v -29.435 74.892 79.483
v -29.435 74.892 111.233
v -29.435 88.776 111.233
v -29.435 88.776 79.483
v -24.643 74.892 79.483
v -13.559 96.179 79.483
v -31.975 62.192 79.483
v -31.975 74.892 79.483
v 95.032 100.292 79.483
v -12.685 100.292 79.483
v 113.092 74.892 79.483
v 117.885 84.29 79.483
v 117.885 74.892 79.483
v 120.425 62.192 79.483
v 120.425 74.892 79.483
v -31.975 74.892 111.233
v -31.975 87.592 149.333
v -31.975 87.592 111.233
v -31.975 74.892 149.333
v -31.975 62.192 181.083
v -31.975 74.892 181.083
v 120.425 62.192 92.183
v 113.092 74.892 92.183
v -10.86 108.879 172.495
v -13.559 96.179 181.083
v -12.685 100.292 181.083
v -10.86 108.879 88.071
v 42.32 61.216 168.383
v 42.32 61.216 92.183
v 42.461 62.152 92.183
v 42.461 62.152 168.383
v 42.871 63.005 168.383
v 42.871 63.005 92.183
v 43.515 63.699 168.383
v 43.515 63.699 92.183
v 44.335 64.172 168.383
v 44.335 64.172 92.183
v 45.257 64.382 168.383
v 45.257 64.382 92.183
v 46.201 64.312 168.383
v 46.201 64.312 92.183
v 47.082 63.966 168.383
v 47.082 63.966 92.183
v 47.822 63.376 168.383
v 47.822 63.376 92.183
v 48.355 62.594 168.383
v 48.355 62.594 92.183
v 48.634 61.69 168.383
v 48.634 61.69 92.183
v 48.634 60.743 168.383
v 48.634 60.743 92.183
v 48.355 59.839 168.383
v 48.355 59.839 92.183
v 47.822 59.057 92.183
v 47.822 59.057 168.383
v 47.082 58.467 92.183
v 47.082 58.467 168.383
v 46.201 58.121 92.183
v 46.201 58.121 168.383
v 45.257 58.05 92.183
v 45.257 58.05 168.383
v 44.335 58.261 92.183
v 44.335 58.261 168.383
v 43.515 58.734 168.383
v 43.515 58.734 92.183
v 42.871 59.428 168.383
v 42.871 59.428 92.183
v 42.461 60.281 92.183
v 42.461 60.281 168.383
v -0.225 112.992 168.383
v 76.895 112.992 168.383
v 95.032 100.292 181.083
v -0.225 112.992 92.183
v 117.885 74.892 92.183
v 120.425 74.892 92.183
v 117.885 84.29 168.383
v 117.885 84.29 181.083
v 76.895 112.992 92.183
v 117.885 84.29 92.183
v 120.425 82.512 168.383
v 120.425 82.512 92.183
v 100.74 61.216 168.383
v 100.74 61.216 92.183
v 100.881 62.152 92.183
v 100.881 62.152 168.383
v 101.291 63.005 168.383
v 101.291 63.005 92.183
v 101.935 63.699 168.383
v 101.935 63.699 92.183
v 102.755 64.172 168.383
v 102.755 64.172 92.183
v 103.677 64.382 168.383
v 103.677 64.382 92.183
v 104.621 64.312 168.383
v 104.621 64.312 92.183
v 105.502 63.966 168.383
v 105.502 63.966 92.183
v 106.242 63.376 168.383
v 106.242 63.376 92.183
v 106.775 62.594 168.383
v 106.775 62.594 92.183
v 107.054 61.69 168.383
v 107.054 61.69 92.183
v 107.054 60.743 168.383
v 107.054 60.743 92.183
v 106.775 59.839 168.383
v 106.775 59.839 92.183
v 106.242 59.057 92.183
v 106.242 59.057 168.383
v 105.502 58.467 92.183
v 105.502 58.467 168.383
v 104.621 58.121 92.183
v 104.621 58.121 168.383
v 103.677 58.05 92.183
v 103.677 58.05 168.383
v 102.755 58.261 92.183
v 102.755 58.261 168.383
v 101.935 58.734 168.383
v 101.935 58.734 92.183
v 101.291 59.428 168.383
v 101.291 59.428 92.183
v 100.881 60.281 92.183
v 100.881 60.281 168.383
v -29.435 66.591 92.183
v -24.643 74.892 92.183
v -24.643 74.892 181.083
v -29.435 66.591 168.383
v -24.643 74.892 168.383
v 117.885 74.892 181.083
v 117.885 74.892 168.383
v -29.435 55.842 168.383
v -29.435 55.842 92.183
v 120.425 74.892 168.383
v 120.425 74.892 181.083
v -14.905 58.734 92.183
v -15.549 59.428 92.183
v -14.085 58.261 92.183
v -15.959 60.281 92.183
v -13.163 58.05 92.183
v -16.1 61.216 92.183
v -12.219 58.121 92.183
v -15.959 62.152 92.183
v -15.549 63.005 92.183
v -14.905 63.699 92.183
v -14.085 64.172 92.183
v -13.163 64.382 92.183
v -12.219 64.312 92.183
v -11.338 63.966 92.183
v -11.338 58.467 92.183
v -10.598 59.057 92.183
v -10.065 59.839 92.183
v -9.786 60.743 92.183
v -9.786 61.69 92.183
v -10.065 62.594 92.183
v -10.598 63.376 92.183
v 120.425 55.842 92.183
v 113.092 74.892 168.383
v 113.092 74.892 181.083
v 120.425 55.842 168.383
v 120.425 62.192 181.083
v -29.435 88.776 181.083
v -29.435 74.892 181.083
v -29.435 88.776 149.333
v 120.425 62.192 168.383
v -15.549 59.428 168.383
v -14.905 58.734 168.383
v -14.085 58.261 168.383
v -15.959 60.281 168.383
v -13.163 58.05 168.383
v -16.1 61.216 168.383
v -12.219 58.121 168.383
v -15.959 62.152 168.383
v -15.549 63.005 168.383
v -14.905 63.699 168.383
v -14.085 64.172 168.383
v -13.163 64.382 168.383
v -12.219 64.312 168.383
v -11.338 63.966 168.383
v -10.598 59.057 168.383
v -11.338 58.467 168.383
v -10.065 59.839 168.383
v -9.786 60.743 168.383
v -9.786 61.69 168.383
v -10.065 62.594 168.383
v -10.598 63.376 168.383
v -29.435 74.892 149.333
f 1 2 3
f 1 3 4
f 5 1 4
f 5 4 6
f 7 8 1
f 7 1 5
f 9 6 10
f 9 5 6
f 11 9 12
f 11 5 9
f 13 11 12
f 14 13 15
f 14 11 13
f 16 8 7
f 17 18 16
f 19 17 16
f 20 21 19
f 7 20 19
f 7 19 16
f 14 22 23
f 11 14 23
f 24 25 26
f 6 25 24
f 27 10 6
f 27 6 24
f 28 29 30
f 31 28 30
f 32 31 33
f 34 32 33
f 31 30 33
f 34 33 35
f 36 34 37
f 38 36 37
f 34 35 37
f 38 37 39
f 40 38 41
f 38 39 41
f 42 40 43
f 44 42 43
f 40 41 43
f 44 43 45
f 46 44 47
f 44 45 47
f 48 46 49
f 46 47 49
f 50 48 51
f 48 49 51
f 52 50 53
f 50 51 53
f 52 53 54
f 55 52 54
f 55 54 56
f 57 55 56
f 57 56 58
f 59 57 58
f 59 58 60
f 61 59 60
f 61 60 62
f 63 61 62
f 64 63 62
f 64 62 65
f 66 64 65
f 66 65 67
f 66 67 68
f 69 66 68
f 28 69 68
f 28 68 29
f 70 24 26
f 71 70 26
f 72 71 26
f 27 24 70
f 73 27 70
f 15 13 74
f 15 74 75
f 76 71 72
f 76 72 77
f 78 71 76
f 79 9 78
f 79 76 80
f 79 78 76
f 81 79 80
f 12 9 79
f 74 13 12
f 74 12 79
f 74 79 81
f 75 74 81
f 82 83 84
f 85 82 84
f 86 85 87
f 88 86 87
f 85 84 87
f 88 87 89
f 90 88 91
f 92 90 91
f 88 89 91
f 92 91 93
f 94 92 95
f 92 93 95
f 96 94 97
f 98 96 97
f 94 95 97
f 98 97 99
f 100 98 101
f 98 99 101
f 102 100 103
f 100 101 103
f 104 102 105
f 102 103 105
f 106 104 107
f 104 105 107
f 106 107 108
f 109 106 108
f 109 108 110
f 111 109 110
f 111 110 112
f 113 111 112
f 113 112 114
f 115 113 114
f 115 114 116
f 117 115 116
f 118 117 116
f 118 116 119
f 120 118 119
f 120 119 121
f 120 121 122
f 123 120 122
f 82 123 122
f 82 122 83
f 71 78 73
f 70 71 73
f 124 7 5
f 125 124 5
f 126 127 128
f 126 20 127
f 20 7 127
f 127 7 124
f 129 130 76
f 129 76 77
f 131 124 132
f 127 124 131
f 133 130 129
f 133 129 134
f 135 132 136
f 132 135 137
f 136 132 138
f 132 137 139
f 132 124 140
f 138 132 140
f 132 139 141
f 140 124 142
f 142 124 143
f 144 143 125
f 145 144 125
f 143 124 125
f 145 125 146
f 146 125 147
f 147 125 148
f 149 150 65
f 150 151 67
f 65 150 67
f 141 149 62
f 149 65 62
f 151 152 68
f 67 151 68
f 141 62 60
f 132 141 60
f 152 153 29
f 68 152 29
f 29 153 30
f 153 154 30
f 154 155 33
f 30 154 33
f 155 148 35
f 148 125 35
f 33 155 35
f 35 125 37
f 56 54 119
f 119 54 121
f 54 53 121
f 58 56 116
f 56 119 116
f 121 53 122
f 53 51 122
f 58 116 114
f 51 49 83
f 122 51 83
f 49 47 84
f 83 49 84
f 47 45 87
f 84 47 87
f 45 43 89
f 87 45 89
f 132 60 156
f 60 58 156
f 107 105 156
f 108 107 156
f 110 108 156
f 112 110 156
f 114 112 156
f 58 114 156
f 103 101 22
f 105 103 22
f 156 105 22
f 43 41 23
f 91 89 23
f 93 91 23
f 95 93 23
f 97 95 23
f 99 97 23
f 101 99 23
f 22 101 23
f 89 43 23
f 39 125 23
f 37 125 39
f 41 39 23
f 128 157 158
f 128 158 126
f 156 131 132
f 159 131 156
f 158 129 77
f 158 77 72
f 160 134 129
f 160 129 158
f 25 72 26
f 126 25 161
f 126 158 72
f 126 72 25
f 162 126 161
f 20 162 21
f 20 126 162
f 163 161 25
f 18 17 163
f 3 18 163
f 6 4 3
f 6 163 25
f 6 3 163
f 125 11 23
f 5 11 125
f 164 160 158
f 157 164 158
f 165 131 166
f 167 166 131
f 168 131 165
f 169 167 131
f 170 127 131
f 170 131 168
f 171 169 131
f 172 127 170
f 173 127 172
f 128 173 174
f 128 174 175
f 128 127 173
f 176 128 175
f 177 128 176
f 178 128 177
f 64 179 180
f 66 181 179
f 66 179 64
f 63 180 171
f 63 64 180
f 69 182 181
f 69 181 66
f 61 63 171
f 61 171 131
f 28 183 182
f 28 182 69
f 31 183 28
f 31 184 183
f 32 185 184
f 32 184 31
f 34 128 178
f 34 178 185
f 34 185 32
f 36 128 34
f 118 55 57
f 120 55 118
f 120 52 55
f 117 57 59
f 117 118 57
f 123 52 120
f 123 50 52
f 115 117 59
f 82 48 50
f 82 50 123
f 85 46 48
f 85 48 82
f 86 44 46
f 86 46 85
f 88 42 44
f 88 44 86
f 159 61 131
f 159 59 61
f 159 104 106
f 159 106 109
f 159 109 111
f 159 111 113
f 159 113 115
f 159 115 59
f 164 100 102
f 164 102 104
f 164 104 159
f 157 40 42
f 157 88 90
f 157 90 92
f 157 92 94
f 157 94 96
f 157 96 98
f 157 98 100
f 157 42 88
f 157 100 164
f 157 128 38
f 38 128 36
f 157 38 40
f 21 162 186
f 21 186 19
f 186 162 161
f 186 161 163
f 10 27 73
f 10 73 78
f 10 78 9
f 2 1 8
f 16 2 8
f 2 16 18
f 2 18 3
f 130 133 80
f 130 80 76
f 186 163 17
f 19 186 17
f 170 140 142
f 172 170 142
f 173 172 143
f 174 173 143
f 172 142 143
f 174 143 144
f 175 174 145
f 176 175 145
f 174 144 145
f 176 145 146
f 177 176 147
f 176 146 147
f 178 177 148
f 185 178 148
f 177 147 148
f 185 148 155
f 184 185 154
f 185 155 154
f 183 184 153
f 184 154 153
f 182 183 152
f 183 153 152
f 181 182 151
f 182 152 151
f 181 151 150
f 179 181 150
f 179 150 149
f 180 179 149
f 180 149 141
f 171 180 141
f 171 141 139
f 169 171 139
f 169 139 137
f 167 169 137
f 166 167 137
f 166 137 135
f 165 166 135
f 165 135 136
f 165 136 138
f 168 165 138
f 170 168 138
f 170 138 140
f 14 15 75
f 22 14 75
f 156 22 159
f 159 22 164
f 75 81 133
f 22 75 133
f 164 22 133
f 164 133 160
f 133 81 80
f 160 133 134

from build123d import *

# Parameters (mm, degrees)
BOSS_EXTRUDE1_DEPTH             = 38.1
CUT_EXTRUDE1_DEPTH              = 100.190170884
CUT_EXTRUDE1_DEPTH_BACK         = 100.190170884
BOSS_EXTRUDE2_REACH             = 101.19
BOSS_EXTRUDE2_DIRECTION_2_REACH = 101.19
CUT_EXTRUDE2_DEPTH              = 100.190170884
CUT_EXTRUDE2_DEPTH_BACK         = 100.190170884
SKETCH5_W                       = 149.86
SKETCH5_H                       = 76.2
BOSS_EXTRUDE4_DEPTH             = 19.05
SKETCH6_R                       = 3.175
CUT_EXTRUDE3_DEPTH              = 188.543158451


with BuildPart() as part:
    # Sketch1 → Boss-Extrude1 (new body)
    with BuildSketch(Plane(origin=(44.224720049, 74.891650501, 130.282900288), x_dir=(1, 0, 0), z_dir=(0, 1, 0))):
        Polygon((-73.66, -50.8), (-73.66, -19.05), (-76.2, -19.05), (-76.2, 19.05), (-73.66, 19.05), (-73.66, 50.8), (73.66, 50.8), (73.66, 38.1), (76.2, 38.1), (76.2, -38.1), (73.66, -38.1), (73.66, -50.8), align=None)
    extrude(amount=BOSS_EXTRUDE1_DEPTH)

    # Sketch2 → Cut-Extrude1 (cut, two sides: drawn at the far end of the back side and taken through both)
    with BuildSketch(Plane(origin=(44.224720049, 74.891650501, 130.282900288), x_dir=(1, 0, 0), z_dir=(0, 0, 1)).offset(-CUT_EXTRUDE1_DEPTH_BACK)):
        Polygon((-76.2, 12.7), (-57.783825767, 21.287603079), (-55.084357434, 33.987603079), (-44.45, 38.1), (-76.2, 38.1), align=None)
        Polygon((32.670048754, 38.1), (76.2, 7.62), (76.2, 38.1), align=None)
    extrude(amount=CUT_EXTRUDE1_DEPTH + CUT_EXTRUDE1_DEPTH_BACK, mode=Mode.SUBTRACT)

    # Boss-Extrude2: up to this face of the body (flat: up to its plane)
    boss_extrude2_end = Plane(part.part.faces().sort_by_distance((41.857775963, 91.970339861, 181.082900288))[0])
    # Sketch3 → Boss-Extrude2 (add, up to the picked face)
    with BuildSketch(Plane(origin=(44.224720049, 74.891650501, 130.282900288), x_dir=(1, 0, 0), z_dir=(0, 0, 1)), mode=Mode.PRIVATE) as boss_extrude2_sk1:
        Polygon((-76.2, 0), (-76.2, -12.7), (-68.867651581, 0), align=None)
    boss_extrude2_tool1 = split(extrude(boss_extrude2_sk1.sketch, amount=BOSS_EXTRUDE2_REACH, mode=Mode.PRIVATE), bisect_by=boss_extrude2_end, keep=Keep.BOTH, mode=Mode.PRIVATE)
    # Sketch3 → Boss-Extrude2 (add, up to the picked face)
    with BuildSketch(Plane(origin=(44.224720049, 74.891650501, 130.282900288), x_dir=(1, 0, 0), z_dir=(0, 0, 1)), mode=Mode.PRIVATE) as boss_extrude2_sk2:
        Polygon((76.2, 0), (76.2, -12.7), (68.867651581, 0), align=None)
    boss_extrude2_tool2 = split(extrude(boss_extrude2_sk2.sketch, amount=BOSS_EXTRUDE2_REACH, mode=Mode.PRIVATE), bisect_by=boss_extrude2_end, keep=Keep.BOTH, mode=Mode.PRIVATE)
    add(boss_extrude2_tool1.solids().sort_by(Axis((-29.531164, 70.658317, 130.2829), (0, 0, 1)))[0])
    add(boss_extrude2_tool2.solids().sort_by(Axis((117.980604, 70.658317, 130.2829), (0, 0, 1)))[0])

    # Boss-Extrude2 direction 2: up to this face of the body (flat: up to its plane)
    boss_extrude2_direction_2_end = Plane(part.part.faces().sort_by_distance((41.857775963, 91.970339861, 79.482900288))[0])
    # Sketch3 → Boss-Extrude2 direction 2 (add, up to the picked face)
    with BuildSketch(Plane(origin=(44.224720049, 74.891650501, 130.282900288), x_dir=(1, 0, 0), z_dir=(0, 0, 1)), mode=Mode.PRIVATE) as boss_extrude2_direction_2_sk1:
        Polygon((-76.2, 0), (-76.2, -12.7), (-68.867651581, 0), align=None)
    boss_extrude2_direction_2_tool1 = split(extrude(boss_extrude2_direction_2_sk1.sketch, amount=-BOSS_EXTRUDE2_DIRECTION_2_REACH, mode=Mode.PRIVATE), bisect_by=boss_extrude2_direction_2_end, keep=Keep.BOTH, mode=Mode.PRIVATE)
    # Sketch3 → Boss-Extrude2 direction 2 (add, up to the picked face)
    with BuildSketch(Plane(origin=(44.224720049, 74.891650501, 130.282900288), x_dir=(1, 0, 0), z_dir=(0, 0, 1)), mode=Mode.PRIVATE) as boss_extrude2_direction_2_sk2:
        Polygon((76.2, 0), (76.2, -12.7), (68.867651581, 0), align=None)
    boss_extrude2_direction_2_tool2 = split(extrude(boss_extrude2_direction_2_sk2.sketch, amount=-BOSS_EXTRUDE2_DIRECTION_2_REACH, mode=Mode.PRIVATE), bisect_by=boss_extrude2_direction_2_end, keep=Keep.BOTH, mode=Mode.PRIVATE)
    add(boss_extrude2_direction_2_tool1.solids().sort_by(Axis((-29.531164, 70.658317, 130.2829), (0, 0, -1)))[0])
    add(boss_extrude2_direction_2_tool2.solids().sort_by(Axis((117.980604, 70.658317, 130.2829), (0, 0, -1)))[0])

    # Sketch4 → Cut-Extrude2 (cut, two sides: drawn at the far end of the back side and taken through both)
    with BuildSketch(Plane(origin=(44.224720049, 74.891650501, 130.282900288), x_dir=(0, 0, -1), z_dir=(1, 0, 0)).offset(-CUT_EXTRUDE2_DEPTH_BACK)):
        Polygon((-38.1, 38.1), (-50.8, 25.4), (-50.8, 38.1), align=None)
        Polygon((38.1, 38.1), (50.8, 25.4), (50.8, 38.1), align=None)
    extrude(amount=CUT_EXTRUDE2_DEPTH + CUT_EXTRUDE2_DEPTH_BACK, mode=Mode.SUBTRACT)

    # Sketch5 → Boss-Extrude4 (add)
    with BuildSketch(Plane.XZ.offset(-74.891650501)):
        with Locations((45.494720049, 130.282900288)):
            Rectangle(SKETCH5_W, SKETCH5_H)
    extrude(amount=BOSS_EXTRUDE4_DEPTH)

    # Sketch6 → Cut-Extrude3 (cut, through all)
    with BuildSketch(Plane(origin=(0, 0, 92.182900288), x_dir=(-1, 0, 0), z_dir=(0, 0, -1))):
        with Locations((-103.914720049, 61.216355026)):
            Circle(SKETCH6_R)
        with Locations((-45.494720049, 61.216355026)):
            Circle(SKETCH6_R)
        with Locations((12.925279951, 61.216355026)):
            Circle(SKETCH6_R)
    extrude(amount=-CUT_EXTRUDE3_DEPTH, mode=Mode.SUBTRACT)


solid = part.part
